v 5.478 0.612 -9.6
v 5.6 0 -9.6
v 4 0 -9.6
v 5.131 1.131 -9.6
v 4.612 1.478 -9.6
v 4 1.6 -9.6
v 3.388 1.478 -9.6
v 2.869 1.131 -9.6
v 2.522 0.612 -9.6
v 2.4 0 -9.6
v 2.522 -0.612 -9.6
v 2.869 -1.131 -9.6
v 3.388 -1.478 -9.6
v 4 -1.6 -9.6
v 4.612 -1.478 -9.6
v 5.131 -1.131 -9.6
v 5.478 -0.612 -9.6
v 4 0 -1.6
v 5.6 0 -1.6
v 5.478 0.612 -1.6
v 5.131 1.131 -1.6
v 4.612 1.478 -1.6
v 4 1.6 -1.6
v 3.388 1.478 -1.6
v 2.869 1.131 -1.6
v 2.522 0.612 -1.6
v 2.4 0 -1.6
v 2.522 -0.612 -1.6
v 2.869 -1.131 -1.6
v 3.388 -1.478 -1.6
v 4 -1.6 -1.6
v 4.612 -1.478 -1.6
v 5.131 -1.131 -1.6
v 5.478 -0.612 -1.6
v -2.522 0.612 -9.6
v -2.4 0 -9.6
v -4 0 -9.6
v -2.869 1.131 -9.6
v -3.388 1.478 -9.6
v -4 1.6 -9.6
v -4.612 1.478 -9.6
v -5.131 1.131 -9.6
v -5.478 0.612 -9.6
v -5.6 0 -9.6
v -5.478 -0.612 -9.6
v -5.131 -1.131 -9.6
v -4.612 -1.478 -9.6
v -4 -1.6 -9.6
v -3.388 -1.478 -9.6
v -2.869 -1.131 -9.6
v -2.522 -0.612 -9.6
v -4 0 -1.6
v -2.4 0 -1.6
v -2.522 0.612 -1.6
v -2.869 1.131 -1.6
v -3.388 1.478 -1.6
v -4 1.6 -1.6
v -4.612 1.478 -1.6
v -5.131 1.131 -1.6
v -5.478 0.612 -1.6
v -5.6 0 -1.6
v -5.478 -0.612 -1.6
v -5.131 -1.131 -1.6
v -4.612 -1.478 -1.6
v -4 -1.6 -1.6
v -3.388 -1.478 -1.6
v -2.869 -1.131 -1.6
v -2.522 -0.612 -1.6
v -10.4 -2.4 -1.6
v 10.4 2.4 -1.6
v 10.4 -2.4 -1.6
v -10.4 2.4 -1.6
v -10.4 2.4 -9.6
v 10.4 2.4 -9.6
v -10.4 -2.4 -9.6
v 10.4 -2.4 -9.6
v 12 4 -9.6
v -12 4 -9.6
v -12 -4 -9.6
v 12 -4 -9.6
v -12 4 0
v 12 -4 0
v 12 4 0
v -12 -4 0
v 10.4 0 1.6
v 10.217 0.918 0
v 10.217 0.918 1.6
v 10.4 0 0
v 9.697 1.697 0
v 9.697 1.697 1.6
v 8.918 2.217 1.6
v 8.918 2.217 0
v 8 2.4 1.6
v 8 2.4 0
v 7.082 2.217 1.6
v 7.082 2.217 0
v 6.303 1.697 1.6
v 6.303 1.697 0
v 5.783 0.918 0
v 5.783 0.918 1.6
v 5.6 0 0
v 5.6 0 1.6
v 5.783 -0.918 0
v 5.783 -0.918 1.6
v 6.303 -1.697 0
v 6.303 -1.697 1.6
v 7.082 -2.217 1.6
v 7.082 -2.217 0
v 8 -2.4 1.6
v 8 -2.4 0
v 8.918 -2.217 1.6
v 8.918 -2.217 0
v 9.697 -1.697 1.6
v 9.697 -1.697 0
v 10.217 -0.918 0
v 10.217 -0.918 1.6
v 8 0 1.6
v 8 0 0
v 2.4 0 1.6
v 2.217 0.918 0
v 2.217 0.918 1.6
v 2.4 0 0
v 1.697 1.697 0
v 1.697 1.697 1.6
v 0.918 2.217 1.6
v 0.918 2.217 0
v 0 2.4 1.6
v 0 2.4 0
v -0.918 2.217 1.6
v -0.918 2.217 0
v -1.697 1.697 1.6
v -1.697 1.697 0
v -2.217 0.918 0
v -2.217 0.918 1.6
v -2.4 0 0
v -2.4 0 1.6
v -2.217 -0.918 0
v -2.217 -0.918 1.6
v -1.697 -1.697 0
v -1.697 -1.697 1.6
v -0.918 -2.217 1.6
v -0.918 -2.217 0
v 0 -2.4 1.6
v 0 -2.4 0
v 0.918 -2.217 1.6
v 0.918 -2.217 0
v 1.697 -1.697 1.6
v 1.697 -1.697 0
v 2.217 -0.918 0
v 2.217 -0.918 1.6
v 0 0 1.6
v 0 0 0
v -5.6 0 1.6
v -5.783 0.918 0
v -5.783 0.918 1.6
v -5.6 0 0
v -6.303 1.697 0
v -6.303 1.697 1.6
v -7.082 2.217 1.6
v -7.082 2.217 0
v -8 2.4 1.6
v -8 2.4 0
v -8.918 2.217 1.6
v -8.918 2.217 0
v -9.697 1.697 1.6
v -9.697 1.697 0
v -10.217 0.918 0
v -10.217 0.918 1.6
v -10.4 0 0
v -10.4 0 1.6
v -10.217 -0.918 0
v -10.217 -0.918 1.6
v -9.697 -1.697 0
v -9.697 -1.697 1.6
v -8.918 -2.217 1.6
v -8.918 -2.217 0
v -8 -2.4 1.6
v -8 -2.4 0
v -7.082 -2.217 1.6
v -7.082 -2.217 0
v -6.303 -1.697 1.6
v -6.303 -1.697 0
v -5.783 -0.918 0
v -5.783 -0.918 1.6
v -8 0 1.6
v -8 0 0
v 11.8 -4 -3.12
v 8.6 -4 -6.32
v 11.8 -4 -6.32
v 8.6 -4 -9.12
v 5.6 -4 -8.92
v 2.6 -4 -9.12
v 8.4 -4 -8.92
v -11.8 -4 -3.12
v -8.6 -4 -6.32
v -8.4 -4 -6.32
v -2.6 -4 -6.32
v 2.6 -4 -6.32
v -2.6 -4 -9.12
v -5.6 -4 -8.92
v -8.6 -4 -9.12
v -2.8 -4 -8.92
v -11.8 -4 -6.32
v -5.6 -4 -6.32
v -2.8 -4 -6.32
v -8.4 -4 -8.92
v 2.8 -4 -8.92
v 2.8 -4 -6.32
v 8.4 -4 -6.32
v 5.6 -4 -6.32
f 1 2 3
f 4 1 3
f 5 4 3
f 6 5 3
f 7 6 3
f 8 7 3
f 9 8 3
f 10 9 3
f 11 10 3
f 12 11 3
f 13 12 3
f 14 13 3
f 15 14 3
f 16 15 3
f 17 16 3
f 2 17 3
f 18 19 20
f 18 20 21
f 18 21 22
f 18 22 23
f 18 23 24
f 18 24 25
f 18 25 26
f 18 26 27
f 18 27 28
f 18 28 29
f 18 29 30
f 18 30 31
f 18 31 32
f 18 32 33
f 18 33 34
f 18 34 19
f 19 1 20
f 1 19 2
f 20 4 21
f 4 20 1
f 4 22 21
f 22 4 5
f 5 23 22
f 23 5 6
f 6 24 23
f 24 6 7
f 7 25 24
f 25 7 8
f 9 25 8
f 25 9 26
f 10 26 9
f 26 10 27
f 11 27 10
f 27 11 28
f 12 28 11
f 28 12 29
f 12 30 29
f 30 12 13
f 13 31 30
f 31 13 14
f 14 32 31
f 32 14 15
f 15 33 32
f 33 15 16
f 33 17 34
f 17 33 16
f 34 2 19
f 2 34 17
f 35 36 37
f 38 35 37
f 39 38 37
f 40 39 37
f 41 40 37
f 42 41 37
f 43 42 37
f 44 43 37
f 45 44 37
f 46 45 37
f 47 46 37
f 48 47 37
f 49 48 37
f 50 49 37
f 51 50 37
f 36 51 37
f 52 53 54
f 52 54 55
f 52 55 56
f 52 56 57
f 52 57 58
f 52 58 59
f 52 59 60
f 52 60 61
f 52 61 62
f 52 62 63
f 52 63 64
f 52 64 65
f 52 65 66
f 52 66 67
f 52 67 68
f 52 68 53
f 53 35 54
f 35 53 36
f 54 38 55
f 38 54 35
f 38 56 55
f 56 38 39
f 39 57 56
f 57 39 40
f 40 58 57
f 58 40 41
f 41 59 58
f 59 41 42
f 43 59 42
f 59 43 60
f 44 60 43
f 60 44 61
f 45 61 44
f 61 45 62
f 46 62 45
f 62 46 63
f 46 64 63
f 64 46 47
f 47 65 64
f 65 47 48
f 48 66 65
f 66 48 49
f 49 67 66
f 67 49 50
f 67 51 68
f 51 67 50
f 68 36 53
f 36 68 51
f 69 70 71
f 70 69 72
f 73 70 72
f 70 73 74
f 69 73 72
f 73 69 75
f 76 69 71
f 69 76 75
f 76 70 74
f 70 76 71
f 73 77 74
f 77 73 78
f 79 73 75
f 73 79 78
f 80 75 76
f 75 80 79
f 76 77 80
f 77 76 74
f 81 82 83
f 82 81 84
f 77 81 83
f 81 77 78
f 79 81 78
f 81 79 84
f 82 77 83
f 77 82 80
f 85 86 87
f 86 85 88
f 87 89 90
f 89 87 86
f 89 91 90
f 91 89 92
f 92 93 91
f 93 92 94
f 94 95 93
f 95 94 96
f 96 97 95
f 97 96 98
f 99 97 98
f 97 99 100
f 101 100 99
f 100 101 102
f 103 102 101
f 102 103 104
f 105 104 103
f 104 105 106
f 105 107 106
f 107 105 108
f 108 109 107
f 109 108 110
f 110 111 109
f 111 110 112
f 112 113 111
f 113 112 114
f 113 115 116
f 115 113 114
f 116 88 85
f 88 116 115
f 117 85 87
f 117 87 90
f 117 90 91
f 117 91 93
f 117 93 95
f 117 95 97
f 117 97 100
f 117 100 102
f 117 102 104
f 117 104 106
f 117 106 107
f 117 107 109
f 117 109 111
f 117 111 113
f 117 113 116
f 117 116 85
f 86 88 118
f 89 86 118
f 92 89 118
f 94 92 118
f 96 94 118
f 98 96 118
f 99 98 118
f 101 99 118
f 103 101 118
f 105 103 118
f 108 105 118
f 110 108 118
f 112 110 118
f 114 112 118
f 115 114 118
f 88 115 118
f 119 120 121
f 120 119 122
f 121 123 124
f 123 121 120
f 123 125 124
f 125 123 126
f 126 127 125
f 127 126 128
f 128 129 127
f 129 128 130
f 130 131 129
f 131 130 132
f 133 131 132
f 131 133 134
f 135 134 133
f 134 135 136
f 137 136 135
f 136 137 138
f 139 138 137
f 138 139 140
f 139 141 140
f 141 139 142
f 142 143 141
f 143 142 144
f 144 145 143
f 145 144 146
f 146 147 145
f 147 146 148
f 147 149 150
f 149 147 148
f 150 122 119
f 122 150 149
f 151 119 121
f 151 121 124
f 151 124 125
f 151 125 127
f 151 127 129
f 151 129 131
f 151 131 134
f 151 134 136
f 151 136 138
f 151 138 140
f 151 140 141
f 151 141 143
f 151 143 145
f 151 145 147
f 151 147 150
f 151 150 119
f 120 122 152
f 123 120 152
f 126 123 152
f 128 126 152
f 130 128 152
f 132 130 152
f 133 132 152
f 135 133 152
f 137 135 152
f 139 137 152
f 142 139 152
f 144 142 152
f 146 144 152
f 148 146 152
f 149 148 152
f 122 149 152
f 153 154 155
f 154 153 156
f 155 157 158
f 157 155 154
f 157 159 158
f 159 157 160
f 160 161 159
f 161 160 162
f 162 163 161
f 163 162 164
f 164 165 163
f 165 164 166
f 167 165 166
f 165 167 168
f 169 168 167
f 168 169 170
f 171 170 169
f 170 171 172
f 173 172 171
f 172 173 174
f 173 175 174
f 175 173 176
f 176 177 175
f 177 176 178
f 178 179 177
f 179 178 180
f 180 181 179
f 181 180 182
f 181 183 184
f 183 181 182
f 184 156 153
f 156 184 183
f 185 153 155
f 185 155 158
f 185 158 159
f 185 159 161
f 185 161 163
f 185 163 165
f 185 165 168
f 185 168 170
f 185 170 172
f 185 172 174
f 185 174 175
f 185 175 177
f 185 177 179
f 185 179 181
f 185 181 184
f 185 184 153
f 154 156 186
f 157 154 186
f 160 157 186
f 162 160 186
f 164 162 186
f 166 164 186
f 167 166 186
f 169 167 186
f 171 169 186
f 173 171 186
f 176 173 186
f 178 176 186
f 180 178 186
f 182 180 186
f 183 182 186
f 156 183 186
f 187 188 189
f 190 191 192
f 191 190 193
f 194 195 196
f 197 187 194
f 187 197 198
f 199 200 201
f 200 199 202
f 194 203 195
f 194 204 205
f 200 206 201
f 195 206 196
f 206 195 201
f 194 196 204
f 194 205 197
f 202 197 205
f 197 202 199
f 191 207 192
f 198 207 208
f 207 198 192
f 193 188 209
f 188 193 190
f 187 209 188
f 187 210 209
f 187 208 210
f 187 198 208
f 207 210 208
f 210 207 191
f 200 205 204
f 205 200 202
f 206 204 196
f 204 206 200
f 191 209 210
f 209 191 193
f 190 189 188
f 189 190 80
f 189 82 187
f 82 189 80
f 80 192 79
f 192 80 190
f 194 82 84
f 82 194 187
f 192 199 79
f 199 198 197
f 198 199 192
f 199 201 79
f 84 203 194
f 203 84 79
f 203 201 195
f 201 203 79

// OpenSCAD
// file: ../p/4-4edge.scad
use <../lib.scad>
function ldraw_lib__4_4edge() = [
// 0 Circle 1.0
// 0 Name: 4-4edge.dat
// 0 Author: James Jessiman
// 0 !LDRAW_ORG Primitive UPDATE 2017-01
// 0 !LICENSE Licensed under CC BY 2.0 and CC BY 4.0 : see CAreadme.txt
// 
// 0 BFC CERTIFY CCW
  [0,"BFC","CERTIFY"],
  [0,"BFC","CCW"],
// 
// 0 !HISTORY 1998-12-15 [PTadmin] Official Update 1998-10
// 0 !HISTORY 2005-12-28 [PTadmin] Official Update 2005-01
// 0 !HISTORY 2007-06-24 [PTadmin] Header formatted for Contributor Agreement
// 0 !HISTORY 2008-07-01 [PTadmin] Official Update 2008-01
// 0 !HISTORY 2017-01-15 [Steffen] BFCed
// 0 !HISTORY 2017-12-30 [PTadmin] Official Update 2017-01
// 
// 
// 2 24 1 0 0 0.9239 0 0.3827
  [2,24,1,0,0,0.9239,0,0.3827],
// 2 24 0.9239 0 0.3827 0.7071 0 0.7071
  [2,24,0.9239,0,0.3827,0.7071,0,0.7071],
// 2 24 0.7071 0 0.7071 0.3827 0 0.9239
  [2,24,0.7071,0,0.7071,0.3827,0,0.9239],
// 2 24 0.3827 0 0.9239 0 0 1
  [2,24,0.3827,0,0.9239,0,0,1],
// 2 24 0 0 1 -0.3827 0 0.9239
  [2,24,0,0,1,-0.3827,0,0.9239],
// 2 24 -0.3827 0 0.9239 -0.7071 0 0.7071
  [2,24,-0.3827,0,0.9239,-0.7071,0,0.7071],
// 2 24 -0.7071 0 0.7071 -0.9239 0 0.3827
  [2,24,-0.7071,0,0.7071,-0.9239,0,0.3827],
// 2 24 -0.9239 0 0.3827 -1 0 -0
  [2,24,-0.9239,0,0.3827,-1,0,-0],
// 2 24 -1 0 -0 -0.9239 0 -0.3827
  [2,24,-1,0,-0,-0.9239,0,-0.3827],
// 2 24 -0.9239 0 -0.3827 -0.7071 0 -0.7071
  [2,24,-0.9239,0,-0.3827,-0.7071,0,-0.7071],
// 2 24 -0.7071 0 -0.7071 -0.3827 0 -0.9239
  [2,24,-0.7071,0,-0.7071,-0.3827,0,-0.9239],
// 2 24 -0.3827 0 -0.9239 0 0 -1
  [2,24,-0.3827,0,-0.9239,0,0,-1],
// 2 24 0 0 -1 0.3827 0 -0.9239
  [2,24,0,0,-1,0.3827,0,-0.9239],
// 2 24 0.3827 0 -0.9239 0.7071 0 -0.7071
  [2,24,0.3827,0,-0.9239,0.7071,0,-0.7071],
// 2 24 0.7071 0 -0.7071 0.9239 0 -0.3827
  [2,24,0.7071,0,-0.7071,0.9239,0,-0.3827],
// 2 24 0.9239 0 -0.3827 1 0 0
  [2,24,0.9239,0,-0.3827,1,0,0],
];
module ldraw_lib__4_4edge(step=0, col=false, unit=2/5, alt=false, line=0.2, solid=!$preview)
    makepoly(ldraw_lib__4_4edge(), step=step, col=col, unit=unit, alt=alt, line=line, solid=solid);
ldraw_lib__4_4edge(line=0.2);
// file: ../p/4-4disc.scad
use <../lib.scad>
function ldraw_lib__4_4disc() = [
// 0 Disc 1.0
// 0 Name: 4-4disc.dat
// 0 Author: James Jessiman
// 0 !LDRAW_ORG Primitive UPDATE 2002-02
// 0 !LICENSE Licensed under CC BY 2.0 and CC BY 4.0 : see CAreadme.txt
// 
// 0 BFC CERTIFY CCW
  [0,"BFC","CERTIFY"],
  [0,"BFC","CCW"],
// 
// 0 !HISTORY 1998-12-15 [PTadmin] Official Update 1998-10
// 0 !HISTORY 2002-03-23 [sbliss] Added BFC statement
// 0 !HISTORY 2002-04-25 [PTadmin] Official Update 2002-02
// 0 !HISTORY 2007-06-24 [PTadmin] Header formatted for Contributor Agreement
// 0 !HISTORY 2008-07-01 [PTadmin] Official Update 2008-01
// 
// 
// 3 16 0 0 0 1 0 0 0.9239 0 0.3827
  [3,16,0,0,0,1,0,0,0.9239,0,0.3827],
// 3 16 0 0 0 0.9239 0 0.3827 0.7071 0 0.7071
  [3,16,0,0,0,0.9239,0,0.3827,0.7071,0,0.7071],
// 3 16 0 0 0 0.7071 0 0.7071 0.3827 0 0.9239
  [3,16,0,0,0,0.7071,0,0.7071,0.3827,0,0.9239],
// 3 16 0 0 0 0.3827 0 0.9239 0 0 1
  [3,16,0,0,0,0.3827,0,0.9239,0,0,1],
// 3 16 0 0 0 0 0 1 -0.3827 0 0.9239
  [3,16,0,0,0,0,0,1,-0.3827,0,0.9239],
// 3 16 0 0 0 -0.3827 0 0.9239 -0.7071 0 0.7071
  [3,16,0,0,0,-0.3827,0,0.9239,-0.7071,0,0.7071],
// 3 16 0 0 0 -0.7071 0 0.7071 -0.9239 0 0.3827
  [3,16,0,0,0,-0.7071,0,0.7071,-0.9239,0,0.3827],
// 3 16 0 0 0 -0.9239 0 0.3827 -1 0 -0
  [3,16,0,0,0,-0.9239,0,0.3827,-1,0,-0],
// 3 16 0 0 0 -1 0 -0 -0.9239 0 -0.3827
  [3,16,0,0,0,-1,0,-0,-0.9239,0,-0.3827],
// 3 16 0 0 0 -0.9239 0 -0.3827 -0.7071 0 -0.7071
  [3,16,0,0,0,-0.9239,0,-0.3827,-0.7071,0,-0.7071],
// 3 16 0 0 0 -0.7071 0 -0.7071 -0.3827 0 -0.9239
  [3,16,0,0,0,-0.7071,0,-0.7071,-0.3827,0,-0.9239],
// 3 16 0 0 0 -0.3827 0 -0.9239 0 0 -1
  [3,16,0,0,0,-0.3827,0,-0.9239,0,0,-1],
// 3 16 0 0 0 0 0 -1 0.3827 0 -0.9239
  [3,16,0,0,0,0,0,-1,0.3827,0,-0.9239],
// 3 16 0 0 0 0.3827 0 -0.9239 0.7071 0 -0.7071
  [3,16,0,0,0,0.3827,0,-0.9239,0.7071,0,-0.7071],
// 3 16 0 0 0 0.7071 0 -0.7071 0.9239 0 -0.3827
  [3,16,0,0,0,0.7071,0,-0.7071,0.9239,0,-0.3827],
// 3 16 0 0 0 0.9239 0 -0.3827 1 0 0
  [3,16,0,0,0,0.9239,0,-0.3827,1,0,0],
// 0
];
module ldraw_lib__4_4disc(step=0, col=false, unit=2/5, alt=false, line=0.2, solid=!$preview)
    makepoly(ldraw_lib__4_4disc(), step=step, col=col, unit=unit, alt=alt, line=line, solid=solid);
ldraw_lib__4_4disc(line=0.2);
// file: ../p/4-4cyli.scad
use <../lib.scad>
$fa=1; $fs=0.2;
function ldraw_lib__4_4cyli(realsolid=false) = [
// 0 Cylinder 1.0
// 0 Name: 4-4cyli.dat
// 0 Author: James Jessiman
// 0 !LDRAW_ORG Primitive UPDATE 2005-01
// 0 !LICENSE Licensed under CC BY 2.0 and CC BY 4.0 : see CAreadme.txt
// 
// 0 BFC CERTIFY CCW
  [0,"BFC","CERTIFY"],
  [0,"BFC","CCW"],
// 
// 0 !HISTORY 1998-12-15 [PTadmin] Official Update 1998-10
// 0 !HISTORY 2002-03-23 [sbliss] Added BFC statement; merged headers from files in distributions LDraw 0.27 and Complete.
// 0 !HISTORY 2002-04-25 [PTadmin] Official Update 2002-02
// 0 !HISTORY 2004-12-14 [guyvivan] BFC CCW
// 0 !HISTORY 2005-12-28 [PTadmin] Official Update 2005-01
// 0 !HISTORY 2007-06-24 [PTadmin] Header formatted for Contributor Agreement
// 0 !HISTORY 2008-07-01 [PTadmin] Official Update 2008-01
// 
// 
// 4 16 1 1 0 0.9239 1 0.3827 0.9239 0 0.3827 1 0 0
  [4,16,1,1,0,0.9239,1,0.3827,0.9239,0,0.3827,1,0,0],
// 5 24 1 0 0 1 1 0 0.9239 0 0.3827 0.9239 0 -0.3827
  [5,24,1,0,0,1,1,0,0.9239,0,0.3827,0.9239,0,-0.3827],
// 4 16 0.9239 1 0.3827 0.7071 1 0.7071 0.7071 0 0.7071 0.9239 0 0.3827
  [4,16,0.9239,1,0.3827,0.7071,1,0.7071,0.7071,0,0.7071,0.9239,0,0.3827],
// 5 24 0.9239 0 0.3827 0.9239 1 0.3827 0.7071 0 0.7071 1 0 0
  [5,24,0.9239,0,0.3827,0.9239,1,0.3827,0.7071,0,0.7071,1,0,0],
// 4 16 0.7071 1 0.7071 0.3827 1 0.9239 0.3827 0 0.9239 0.7071 0 0.7071
  [4,16,0.7071,1,0.7071,0.3827,1,0.9239,0.3827,0,0.9239,0.7071,0,0.7071],
// 5 24 0.7071 0 0.7071 0.7071 1 0.7071 0.3827 0 0.9239 0.9239 0 0.3827
  [5,24,0.7071,0,0.7071,0.7071,1,0.7071,0.3827,0,0.9239,0.9239,0,0.3827],
// 4 16 0.3827 1 0.9239 0 1 1 0 0 1 0.3827 0 0.9239
  [4,16,0.3827,1,0.9239,0,1,1,0,0,1,0.3827,0,0.9239],
// 5 24 0.3827 0 0.9239 0.3827 1 0.9239 0 0 1 0.7071 0 0.7071
  [5,24,0.3827,0,0.9239,0.3827,1,0.9239,0,0,1,0.7071,0,0.7071],
// 4 16 0 1 1 -0.3827 1 0.9239 -0.3827 0 0.9239 0 0 1
  [4,16,0,1,1,-0.3827,1,0.9239,-0.3827,0,0.9239,0,0,1],
// 5 24 0 0 1 0 1 1 -0.3827 0 0.9239 0.3827 0 0.9239
  [5,24,0,0,1,0,1,1,-0.3827,0,0.9239,0.3827,0,0.9239],
// 4 16 -0.3827 1 0.9239 -0.7071 1 0.7071 -0.7071 0 0.7071 -0.3827 0 0.9239
  [4,16,-0.3827,1,0.9239,-0.7071,1,0.7071,-0.7071,0,0.7071,-0.3827,0,0.9239],
// 5 24 -0.3827 0 0.9239 -0.3827 1 0.9239 -0.7071 0 0.7071 0 0 1
  [5,24,-0.3827,0,0.9239,-0.3827,1,0.9239,-0.7071,0,0.7071,0,0,1],
// 4 16 -0.7071 1 0.7071 -0.9239 1 0.3827 -0.9239 0 0.3827 -0.7071 0 0.7071
  [4,16,-0.7071,1,0.7071,-0.9239,1,0.3827,-0.9239,0,0.3827,-0.7071,0,0.7071],
// 5 24 -0.7071 0 0.7071 -0.7071 1 0.7071 -0.9239 0 0.3827 -0.3827 0 0.9239
  [5,24,-0.7071,0,0.7071,-0.7071,1,0.7071,-0.9239,0,0.3827,-0.3827,0,0.9239],
// 4 16 -0.9239 1 0.3827 -1 1 0 -1 0 0 -0.9239 0 0.3827
  [4,16,-0.9239,1,0.3827,-1,1,0,-1,0,0,-0.9239,0,0.3827],
// 5 24 -0.9239 0 0.3827 -0.9239 1 0.3827 -1 0 0 -0.7071 0 0.7071
  [5,24,-0.9239,0,0.3827,-0.9239,1,0.3827,-1,0,0,-0.7071,0,0.7071],
// 4 16 -1 1 0 -0.9239 1 -0.3827 -0.9239 0 -0.3827 -1 0 0
  [4,16,-1,1,0,-0.9239,1,-0.3827,-0.9239,0,-0.3827,-1,0,0],
// 5 24 -1 0 0 -1 1 0 -0.9239 0 -0.3827 -0.9239 0 0.3827
  [5,24,-1,0,0,-1,1,0,-0.9239,0,-0.3827,-0.9239,0,0.3827],
// 4 16 -0.9239 1 -0.3827 -0.7071 1 -0.7071 -0.7071 0 -0.7071 -0.9239 0 -0.3827
  [4,16,-0.9239,1,-0.3827,-0.7071,1,-0.7071,-0.7071,0,-0.7071,-0.9239,0,-0.3827],
// 5 24 -0.9239 0 -0.3827 -0.9239 1 -0.3827 -0.7071 0 -0.7071 -1 0 0
  [5,24,-0.9239,0,-0.3827,-0.9239,1,-0.3827,-0.7071,0,-0.7071,-1,0,0],
// 4 16 -0.7071 1 -0.7071 -0.3827 1 -0.9239 -0.3827 0 -0.9239 -0.7071 0 -0.7071
  [4,16,-0.7071,1,-0.7071,-0.3827,1,-0.9239,-0.3827,0,-0.9239,-0.7071,0,-0.7071],
// 5 24 -0.7071 0 -0.7071 -0.7071 1 -0.7071 -0.3827 0 -0.9239 -0.9239 0 -0.3827
  [5,24,-0.7071,0,-0.7071,-0.7071,1,-0.7071,-0.3827,0,-0.9239,-0.9239,0,-0.3827],
// 4 16 -0.3827 1 -0.9239 0 1 -1 0 0 -1 -0.3827 0 -0.9239
  [4,16,-0.3827,1,-0.9239,0,1,-1,0,0,-1,-0.3827,0,-0.9239],
// 5 24 -0.3827 0 -0.9239 -0.3827 1 -0.9239 0 0 -1 -0.7071 0 -0.7071
  [5,24,-0.3827,0,-0.9239,-0.3827,1,-0.9239,0,0,-1,-0.7071,0,-0.7071],
// 4 16 0 1 -1 0.3827 1 -0.9239 0.3827 0 -0.9239 0 0 -1
  [4,16,0,1,-1,0.3827,1,-0.9239,0.3827,0,-0.9239,0,0,-1],
// 5 24 0 0 -1 0 1 -1 0.3827 0 -0.9239 -0.3827 0 -0.9239
  [5,24,0,0,-1,0,1,-1,0.3827,0,-0.9239,-0.3827,0,-0.9239],
// 4 16 0.3827 1 -0.9239 0.7071 1 -0.7071 0.7071 0 -0.7071 0.3827 0 -0.9239
  [4,16,0.3827,1,-0.9239,0.7071,1,-0.7071,0.7071,0,-0.7071,0.3827,0,-0.9239],
// 5 24 0.3827 0 -0.9239 0.3827 1 -0.9239 0.7071 0 -0.7071 0 0 -1
  [5,24,0.3827,0,-0.9239,0.3827,1,-0.9239,0.7071,0,-0.7071,0,0,-1],
// 4 16 0.7071 1 -0.7071 0.9239 1 -0.3827 0.9239 0 -0.3827 0.7071 0 -0.7071
  [4,16,0.7071,1,-0.7071,0.9239,1,-0.3827,0.9239,0,-0.3827,0.7071,0,-0.7071],
// 5 24 0.7071 0 -0.7071 0.7071 1 -0.7071 0.9239 0 -0.3827 0.3827 0 -0.9239
  [5,24,0.7071,0,-0.7071,0.7071,1,-0.7071,0.9239,0,-0.3827,0.3827,0,-0.9239],
// 4 16 0.9239 1 -0.3827 1 1 0 1 0 0 0.9239 0 -0.3827
  [4,16,0.9239,1,-0.3827,1,1,0,1,0,0,0.9239,0,-0.3827],
// 5 24 0.9239 0 -0.3827 0.9239 1 -0.3827 1 0 0 0.7071 0 -0.7071
  [5,24,0.9239,0,-0.3827,0.9239,1,-0.3827,1,0,0,0.7071,0,-0.7071],
// 0
];
module ldraw_lib__4_4cyli(step=0, col=false, unit=2/5, alt=false, line=0.2, solid=!$preview)
    makepoly(ldraw_lib__4_4cyli(solid), step=step, col=col, unit=unit, alt=alt, line=line, solid=solid);
ldraw_lib__4_4cyli(line=0.2);
// file: ../p/stud3.scad
use <../lib.scad>
use <4-4cyli.scad>
use <4-4disc.scad>
use <4-4edge.scad>
function ldraw_lib__stud3() = [
// 0 Stud Tube Solid
// 0 Name: stud3.dat
// 0 Author: James Jessiman
// 0 !LDRAW_ORG Primitive UPDATE 2012-01
// 0 !LICENSE Licensed under CC BY 4.0 : see CAreadme.txt
// 
// 0 BFC CERTIFY CCW
  [0,"BFC","CERTIFY"],
  [0,"BFC","CCW"],
// 
// 0 !HISTORY 2002-04-04 [sbliss] Modified for BFC compliance
// 0 !HISTORY 2002-04-25 [PTadmin] Official Update 2002-02
// 0 !HISTORY 2007-06-24 [PTadmin] Header formatted for Contributor Agreement
// 0 !HISTORY 2008-07-01 [PTadmin] Official Update 2008-01
// 0 !HISTORY 2012-02-16 [Philo] Changed to CCW
// 0 !HISTORY 2012-03-30 [PTadmin] Official Update 2012-01
// 
// 
// 1 16 0 -4 0 4 0 0 0 1 0 0 0 4 4-4edge.dat
  [1,16,0,-4,0,4,0,0,0,1,0,0,0,4, ldraw_lib__4_4edge()],
// 1 16 0 0 0 4 0 0 0 1 0 0 0 4 4-4edge.dat
  [1,16,0,0,0,4,0,0,0,1,0,0,0,4, ldraw_lib__4_4edge()],
// 1 16 0 -4 0 4 0 0 0 1 0 0 0 4 4-4disc.dat
  [1,16,0,-4,0,4,0,0,0,1,0,0,0,4, ldraw_lib__4_4disc()],
  [-1,16,0,0,0,4,0,0,0,-1,0,0,0,4, ldraw_lib__4_4disc()],
// 1 16 0 -4 0 4 0 0 0 4 0 0 0 4 4-4cyli.dat
  [1,16,0,-4,0,4,0,0,0,4,0,0,0,4, ldraw_lib__4_4cyli()],
];
module ldraw_lib__stud3(step=0, col=false, unit=2/5, alt=false, line=0.2, solid=!$preview)
    makepoly(ldraw_lib__stud3(), step=step, col=col, unit=unit, alt=alt, line=line, solid=solid);
ldraw_lib__stud3(line=0.2);
// file: ../p/stud.scad
use <../lib.scad>
use <4-4cyli.scad>
use <4-4disc.scad>
use <4-4edge.scad>
function ldraw_lib__stud() = [
// 0 Stud
// 0 Name: stud.dat
// 0 Author: James Jessiman
// 0 !LDRAW_ORG Primitive UPDATE 2012-01
// 0 !LICENSE Licensed under CC BY 4.0 : see CAreadme.txt
// 
// 0 BFC CERTIFY CCW
  [0,"BFC","CERTIFY"],
  [0,"BFC","CCW"],
// 
// 0 !HISTORY 2002-04-04 [sbliss] Modified for BFC compliance
// 0 !HISTORY 2002-04-25 [PTadmin] Official Update 2002-02
// 0 !HISTORY 2007-06-24 [PTadmin] Header formatted for Contributor Agreement
// 0 !HISTORY 2008-07-01 [PTadmin] Official Update 2008-01
// 0 !HISTORY 2012-02-16 [Philo] Changed to CCW
// 0 !HISTORY 2012-03-30 [PTadmin] Official Update 2012-01
// 
// 
// 1 16 0 0 0 6 0 0 0 1 0 0 0 6 4-4edge.dat
  [1,16,0,0,0,6,0,0,0,1,0,0,0,6, ldraw_lib__4_4edge()],
// 1 16 0 -4 0 6 0 0 0 1 0 0 0 6 4-4edge.dat
  [1,16,0,-4,0,6,0,0,0,1,0,0,0,6, ldraw_lib__4_4edge()],
// 1 16 0 0 0 6 0 0 0 -4 0 0 0 6 4-4cyli.dat
  [1,16,0,0,0,6,0,0,0,-4,0,0,0,6, ldraw_lib__4_4cyli()],
// 1 16 0 -4 0 6 0 0 0 1 0 0 0 6 4-4disc.dat
  [1,16,0,-4,0,6,0,0,0,1,0,0,0,6, ldraw_lib__4_4disc()],
  [-1,16,0,0,0,6,0,0,0,-1,0,0,0,6, ldraw_lib__4_4disc()],
];
module ldraw_lib__stud(step=0, col=false, unit=2/5, alt=false, line=0.2, solid=!$preview)
    makepoly(ldraw_lib__stud(), step=step, col=col, unit=unit, alt=alt, line=line, solid=solid);
ldraw_lib__stud(line=0.2);
// file: ../p/box5.scad
use <../lib.scad>
function ldraw_lib__box5() = [
// 0 Box with 5 Faces and All Edges
// 0 Name: box5.dat
// 0 Author: James Jessiman
// 0 !LDRAW_ORG Primitive UPDATE 2012-01
// 0 !LICENSE Licensed under CC BY 2.0 and CC BY 4.0 : see CAreadme.txt
// 
// 0 BFC CERTIFY CCW
  [0,"BFC","CERTIFY"],
  [0,"BFC","CCW"],
// 
// 0 !HISTORY 2002-04-03 [sbliss] Modified for BFC compliance
// 0 !HISTORY 2002-04-25 [PTadmin] Official Update 2002-02
// 0 !HISTORY 2007-06-24 [PTadmin] Header formatted for Contributor Agreement
// 0 !HISTORY 2008-07-01 [PTadmin] Official Update 2008-01
// 0 !HISTORY 2012-02-16 [Philo] Changed to CCW
// 0 !HISTORY 2012-03-30 [PTadmin] Official Update 2012-01
// 
// 
// 2 24 1 1 1 -1 1 1
  [2,24,1,1,1,-1,1,1],
// 2 24 -1 1 1 -1 1 -1
  [2,24,-1,1,1,-1,1,-1],
// 2 24 -1 1 -1 1 1 -1
  [2,24,-1,1,-1,1,1,-1],
// 2 24 1 1 -1 1 1 1
  [2,24,1,1,-1,1,1,1],
// 2 24 1 0 1 -1 0 1
  [2,24,1,0,1,-1,0,1],
// 2 24 -1 0 1 -1 0 -1
  [2,24,-1,0,1,-1,0,-1],
// 2 24 -1 0 -1 1 0 -1
  [2,24,-1,0,-1,1,0,-1],
// 2 24 1 0 -1 1 0 1
  [2,24,1,0,-1,1,0,1],
// 2 24 1 0 1 1 1 1
  [2,24,1,0,1,1,1,1],
// 2 24 -1 0 1 -1 1 1
  [2,24,-1,0,1,-1,1,1],
// 2 24 1 0 -1 1 1 -1
  [2,24,1,0,-1,1,1,-1],
// 2 24 -1 0 -1 -1 1 -1
  [2,24,-1,0,-1,-1,1,-1],
// 4 16 -1 1 1 1 1 1 1 1 -1 -1 1 -1
  [4,16,-1,1,1,1,1,1,1,1,-1,-1,1,-1],
// 4 16 -1 1 1 -1 0 1 1 0 1 1 1 1
  [4,16,-1,1,1,-1,0,1,1,0,1,1,1,1],
// 4 16 -1 1 -1 -1 0 -1 -1 0 1 -1 1 1
  [4,16,-1,1,-1,-1,0,-1,-1,0,1,-1,1,1],
// 4 16 1 1 -1 1 0 -1 -1 0 -1 -1 1 -1
  [4,16,1,1,-1,1,0,-1,-1,0,-1,-1,1,-1],
// 4 16 1 1 1 1 0 1 1 0 -1 1 1 -1
  [4,16,1,1,1,1,0,1,1,0,-1,1,1,-1],
];
makepoly(ldraw_lib__box5(), line=0.2);
// file: ../p/box4t.scad
use <../lib.scad>
function ldraw_lib__box4t() = [
// 0 Box with 4 Adjacent Faces and All Edges
// 0 Name: box4t.dat
// 0 Author: Tore Eriksson [Tore_Eriksson]
// 0 !LDRAW_ORG Primitive UPDATE 2003-02
// 0 !LICENSE Licensed under CC BY 2.0 and CC BY 4.0 : see CAreadme.txt
// 
// 0 BFC CERTIFY CCW
  [0,"BFC","CERTIFY"],
  [0,"BFC","CCW"],
// 
// 0 !HISTORY 1997-09-29 [PTadmin] Official Update 1997-15
// 0 !HISTORY 2002-08-31 [izanette] Modified with WINDZ for BFC compliance
// 0 !HISTORY 2003-08-01 [PTadmin] Official Update 2003-02
// 0 !HISTORY 2007-06-24 [PTadmin] Header formatted for Contributor Agreement
// 0 !HISTORY 2008-07-01 [PTadmin] Official Update 2008-01
// 
// 
// 2 24 1 1 1 -1 1 1
  [2,24,1,1,1,-1,1,1],
// 2 24 -1 1 1 -1 1 -1
  [2,24,-1,1,1,-1,1,-1],
// 2 24 -1 1 -1 1 1 -1
  [2,24,-1,1,-1,1,1,-1],
// 2 24 1 1 -1 1 1 1
  [2,24,1,1,-1,1,1,1],
// 2 24 1 0 1 -1 0 1
  [2,24,1,0,1,-1,0,1],
// 2 24 -1 0 1 -1 0 -1
  [2,24,-1,0,1,-1,0,-1],
// 2 24 -1 0 -1 1 0 -1
  [2,24,-1,0,-1,1,0,-1],
// 2 24 1 0 -1 1 0 1
  [2,24,1,0,-1,1,0,1],
// 2 24 1 0 1 1 1 1
  [2,24,1,0,1,1,1,1],
// 2 24 -1 0 1 -1 1 1
  [2,24,-1,0,1,-1,1,1],
// 2 24 1 0 -1 1 1 -1
  [2,24,1,0,-1,1,1,-1],
// 2 24 -1 0 -1 -1 1 -1
  [2,24,-1,0,-1,-1,1,-1],
// 4 16 1 1 1 1 1 -1 -1 1 -1 -1 1 1
  [4,16,1,1,1,1,1,-1,-1,1,-1,-1,1,1],
// 4 16 1 1 1 -1 1 1 -1 0 1 1 0 1
  [4,16,1,1,1,-1,1,1,-1,0,1,1,0,1],
// 4 16 -1 1 1 -1 1 -1 -1 0 -1 -1 0 1
  [4,16,-1,1,1,-1,1,-1,-1,0,-1,-1,0,1],
// 0 4 16 -1 1 -1 -1 0 -1 1 0 -1 1 1 -1
// 4 16 1 1 -1 1 1 1 1 0 1 1 0 -1
  [4,16,1,1,-1,1,1,1,1,0,1,1,0,-1],
// 0
];
makepoly(ldraw_lib__box4t(), line=0.2);
// file: s/3622s01.scad
use <../../lib.scad>
use <../../p/box4t.scad>
use <../../p/box5.scad>
use <../../p/stud.scad>
use <../../p/stud3.scad>
function ldraw_lib__s__3622s01() = [
// 0 ~Brick  1 x  3 without Front Face
// 0 Name: s\3622s01.dat
// 0 Author: Andy Westrate [westrate]
// 0 !LDRAW_ORG Subpart UPDATE 2004-02
// 0 !LICENSE Licensed under CC BY 2.0 and CC BY 4.0 : see CAreadme.txt
// 
// 0 BFC CERTIFY CCW
  [0,"BFC","CERTIFY"],
  [0,"BFC","CCW"],
// 
// 0 !HISTORY 2003-10-14 [westrate] Subfiled, BFC'd
// 0 !HISTORY 2004-04-22 [PTadmin] Official Update 2004-02
// 0 !HISTORY 2007-08-31 [PTadmin] Header formatted for Contributor Agreement
// 0 !HISTORY 2008-07-01 [PTadmin] Official Update 2008-01
// 
// 
// 0 // Uncomment the following for front face
// 0 // 4 16 30 0 -10 -30 0 -10 -30 24 -10 30 24 -10
// 1 16 10 4 0 1 0 0 0 -5 0 0 0 1 stud3.dat
  [1,16,10,4,0,1,0,0,0,-5,0,0,0,1, ldraw_lib__stud3()],
// 1 16 -10 4 0 1 0 0 0 -5 0 0 0 1 stud3.dat
  [1,16,-10,4,0,1,0,0,0,-5,0,0,0,1, ldraw_lib__stud3()],
// 
// 0 BFC INVERTNEXT
  [0,"BFC","INVERTNEXT"],
// 1 16 0 24 0 26 0 0 0 -20 0 0 0 6 box5.dat
  [1,16,0,24,0,26,0,0,0,-20,0,0,0,6, ldraw_lib__box5()],
// 
// 4 16 30 24 10 26 24 6 -26 24 6 -30 24 10
  [4,16,30,24,10,26,24,6,-26,24,6,-30,24,10],
// 4 16 -30 24 10 -26 24 6 -26 24 -6 -30 24 -10
  [4,16,-30,24,10,-26,24,6,-26,24,-6,-30,24,-10],
// 4 16 -30 24 -10 -26 24 -6 26 24 -6 30 24 -10
  [4,16,-30,24,-10,-26,24,-6,26,24,-6,30,24,-10],
// 4 16 30 24 -10 26 24 -6 26 24 6 30 24 10
  [4,16,30,24,-10,26,24,-6,26,24,6,30,24,10],
// 
// 1 16 0 24 0 30 0 0 0 -24 0 0 0 10 box4t.dat
  [1,16,0,24,0,30,0,0,0,-24,0,0,0,10, ldraw_lib__box4t()],
// 
// 1 16 20 0 0 1 0 0 0 1 0 0 0 1 stud.dat
  [1,16,20,0,0,1,0,0,0,1,0,0,0,1, ldraw_lib__stud()],
// 1 16 0 0 0 1 0 0 0 1 0 0 0 1 stud.dat
  [1,16,0,0,0,1,0,0,0,1,0,0,0,1, ldraw_lib__stud()],
// 1 16 -20 0 0 1 0 0 0 1 0 0 0 1 stud.dat
  [1,16,-20,0,0,1,0,0,0,1,0,0,0,1, ldraw_lib__stud()],
// 0
];
makepoly(ldraw_lib__s__3622s01(), line=0.2);
// main file
use <../lib.scad>
use <s/3622s01.scad>
function ldraw_lib__3622p0c() = [
// 0 Brick  1 x  3 with Minecraft Pixelated Green Eyes with Black Outline and Unibrow Pattern
// 0 Name: 3622p0c.dat
// 0 Author: Gabriel Läufer [Dr.Bricktacular]
// 0 !LDRAW_ORG Part UPDATE 2026-06
// 0 !LICENSE Licensed under CC BY 4.0 : see CAreadme.txt
// 
// 0 BFC CERTIFY CCW
  [0,"BFC","CERTIFY"],
  [0,"BFC","CCW"],
// 
// 0 !KEYWORDS BrickLink 3622pb158, Brickowl 374429, Brickset 113575, Minecraft
// 0 !KEYWORDS Rebrickable 3622pr0082, Set 21278, The Pillager Outpost and Ravager
// 
// 0 !HISTORY 2026-06-28 [OrionP] Official Update 2026-06
// 
// 0 // Pattern-Basepart
// 1 16 0 0 0 1 0 0 0 1 0 0 0 1 s\3622s01.dat
  [1,16,0,0,0,1,0,0,0,1,0,0,0,1, ldraw_lib__s__3622s01()],
// 
// 0 // Pattern
// 3 0 29.5 7.8 -10 21.5 15.8 -10 29.5 15.8 -10
  [3,0,29.5,7.8,-10,21.5,15.8,-10,29.5,15.8,-10],
// 4 0 14 22.3 -10 6.5 22.8 -10 21.5 22.8 -10 21 22.3 -10
  [4,0,14,22.3,-10,6.5,22.8,-10,21.5,22.8,-10,21,22.3,-10],
// 3 0 -29.5 7.8 -10 -21.5 15.8 -10 -21 15.8 -10
  [3,0,-29.5,7.8,-10,-21.5,15.8,-10,-21,15.8,-10],
// 4 0 -29.5 7.8 -10 -6.5 15.8 -10 6.5 15.8 -10 29.5 7.8 -10
  [4,0,-29.5,7.8,-10,-6.5,15.8,-10,6.5,15.8,-10,29.5,7.8,-10],
// 4 0 -14 22.3 -10 -21.5 22.8 -10 -6.5 22.8 -10 -7 22.3 -10
  [4,0,-14,22.3,-10,-21.5,22.8,-10,-6.5,22.8,-10,-7,22.3,-10],
// 3 0 -29.5 7.8 -10 -29.5 15.8 -10 -21.5 15.8 -10
  [3,0,-29.5,7.8,-10,-29.5,15.8,-10,-21.5,15.8,-10],
// 3 0 -29.5 7.8 -10 -14 15.8 -10 -7 15.8 -10
  [3,0,-29.5,7.8,-10,-14,15.8,-10,-7,15.8,-10],
// 3 0 -14 22.3 -10 -21 22.3 -10 -21.5 22.8 -10
  [3,0,-14,22.3,-10,-21,22.3,-10,-21.5,22.8,-10],
// 4 0 -21 22.3 -10 -21 15.8 -10 -21.5 15.8 -10 -21.5 22.8 -10
  [4,0,-21,22.3,-10,-21,15.8,-10,-21.5,15.8,-10,-21.5,22.8,-10],
// 3 0 -29.5 7.8 -10 -21 15.8 -10 -14 15.8 -10
  [3,0,-29.5,7.8,-10,-21,15.8,-10,-14,15.8,-10],
// 3 0 -29.5 7.8 -10 -7 15.8 -10 -6.5 15.8 -10
  [3,0,-29.5,7.8,-10,-7,15.8,-10,-6.5,15.8,-10],
// 4 0 -7 22.3 -10 -6.5 22.8 -10 -6.5 15.8 -10 -7 15.8 -10
  [4,0,-7,22.3,-10,-6.5,22.8,-10,-6.5,15.8,-10,-7,15.8,-10],
// 3 0 14 22.3 -10 7 22.3 -10 6.5 22.8 -10
  [3,0,14,22.3,-10,7,22.3,-10,6.5,22.8,-10],
// 4 0 7 22.3 -10 7 15.8 -10 6.5 15.8 -10 6.5 22.8 -10
  [4,0,7,22.3,-10,7,15.8,-10,6.5,15.8,-10,6.5,22.8,-10],
// 4 0 21 22.3 -10 21.5 22.8 -10 21.5 15.8 -10 21 15.8 -10
  [4,0,21,22.3,-10,21.5,22.8,-10,21.5,15.8,-10,21,15.8,-10],
// 3 0 29.5 7.8 -10 21 15.8 -10 21.5 15.8 -10
  [3,0,29.5,7.8,-10,21,15.8,-10,21.5,15.8,-10],
// 3 0 29.5 7.8 -10 14 15.8 -10 21 15.8 -10
  [3,0,29.5,7.8,-10,14,15.8,-10,21,15.8,-10],
// 3 0 29.5 7.8 -10 7 15.8 -10 14 15.8 -10
  [3,0,29.5,7.8,-10,7,15.8,-10,14,15.8,-10],
// 3 0 29.5 7.8 -10 6.5 15.8 -10 7 15.8 -10
  [3,0,29.5,7.8,-10,6.5,15.8,-10,7,15.8,-10],
// 4 2 7 22.3 -10 14 22.3 -10 14 15.8 -10 7 15.8 -10
  [4,2,7,22.3,-10,14,22.3,-10,14,15.8,-10,7,15.8,-10],
// 4 2 -7 15.8 -10 -14 15.8 -10 -14 22.3 -10 -7 22.3 -10
  [4,2,-7,15.8,-10,-14,15.8,-10,-14,22.3,-10,-7,22.3,-10],
// 4 15 -21 22.3 -10 -14 22.3 -10 -14 15.8 -10 -21 15.8 -10
  [4,15,-21,22.3,-10,-14,22.3,-10,-14,15.8,-10,-21,15.8,-10],
// 4 15 21 15.8 -10 14 15.8 -10 14 22.3 -10 21 22.3 -10
  [4,15,21,15.8,-10,14,15.8,-10,14,22.3,-10,21,22.3,-10],
// 4 16 21.5 22.8 -10 30 24 -10 29.5 15.8 -10 21.5 15.8 -10
  [4,16,21.5,22.8,-10,30,24,-10,29.5,15.8,-10,21.5,15.8,-10],
// 4 16 29.5 15.8 -10 30 24 -10 30 0 -10 29.5 7.8 -10
  [4,16,29.5,15.8,-10,30,24,-10,30,0,-10,29.5,7.8,-10],
// 4 16 6.5 22.8 -10 -30 24 -10 30 24 -10 21.5 22.8 -10
  [4,16,6.5,22.8,-10,-30,24,-10,30,24,-10,21.5,22.8,-10],
// 4 16 -29.5 7.8 -10 29.5 7.8 -10 30 0 -10 -30 0 -10
  [4,16,-29.5,7.8,-10,29.5,7.8,-10,30,0,-10,-30,0,-10],
// 3 16 6.5 22.8 -10 -6.5 22.8 -10 -30 24 -10
  [3,16,6.5,22.8,-10,-6.5,22.8,-10,-30,24,-10],
// 4 16 6.5 22.8 -10 6.5 15.8 -10 -6.5 15.8 -10 -6.5 22.8 -10
  [4,16,6.5,22.8,-10,6.5,15.8,-10,-6.5,15.8,-10,-6.5,22.8,-10],
// 3 16 -6.5 22.8 -10 -21.5 22.8 -10 -30 24 -10
  [3,16,-6.5,22.8,-10,-21.5,22.8,-10,-30,24,-10],
// 4 16 -30 0 -10 -30 24 -10 -29.5 15.8 -10 -29.5 7.8 -10
  [4,16,-30,0,-10,-30,24,-10,-29.5,15.8,-10,-29.5,7.8,-10],
// 4 16 -29.5 15.8 -10 -30 24 -10 -21.5 22.8 -10 -21.5 15.8 -10
  [4,16,-29.5,15.8,-10,-30,24,-10,-21.5,22.8,-10,-21.5,15.8,-10],
];
module ldraw_lib__3622p0c(step=0, col=false, unit=2/5, alt=false, line=0.2, solid=!$preview)
    makepoly(ldraw_lib__3622p0c(), step=step, col=col, unit=unit, alt=alt, line=line, solid=solid);
ldraw_lib__3622p0c(line=0.2);
